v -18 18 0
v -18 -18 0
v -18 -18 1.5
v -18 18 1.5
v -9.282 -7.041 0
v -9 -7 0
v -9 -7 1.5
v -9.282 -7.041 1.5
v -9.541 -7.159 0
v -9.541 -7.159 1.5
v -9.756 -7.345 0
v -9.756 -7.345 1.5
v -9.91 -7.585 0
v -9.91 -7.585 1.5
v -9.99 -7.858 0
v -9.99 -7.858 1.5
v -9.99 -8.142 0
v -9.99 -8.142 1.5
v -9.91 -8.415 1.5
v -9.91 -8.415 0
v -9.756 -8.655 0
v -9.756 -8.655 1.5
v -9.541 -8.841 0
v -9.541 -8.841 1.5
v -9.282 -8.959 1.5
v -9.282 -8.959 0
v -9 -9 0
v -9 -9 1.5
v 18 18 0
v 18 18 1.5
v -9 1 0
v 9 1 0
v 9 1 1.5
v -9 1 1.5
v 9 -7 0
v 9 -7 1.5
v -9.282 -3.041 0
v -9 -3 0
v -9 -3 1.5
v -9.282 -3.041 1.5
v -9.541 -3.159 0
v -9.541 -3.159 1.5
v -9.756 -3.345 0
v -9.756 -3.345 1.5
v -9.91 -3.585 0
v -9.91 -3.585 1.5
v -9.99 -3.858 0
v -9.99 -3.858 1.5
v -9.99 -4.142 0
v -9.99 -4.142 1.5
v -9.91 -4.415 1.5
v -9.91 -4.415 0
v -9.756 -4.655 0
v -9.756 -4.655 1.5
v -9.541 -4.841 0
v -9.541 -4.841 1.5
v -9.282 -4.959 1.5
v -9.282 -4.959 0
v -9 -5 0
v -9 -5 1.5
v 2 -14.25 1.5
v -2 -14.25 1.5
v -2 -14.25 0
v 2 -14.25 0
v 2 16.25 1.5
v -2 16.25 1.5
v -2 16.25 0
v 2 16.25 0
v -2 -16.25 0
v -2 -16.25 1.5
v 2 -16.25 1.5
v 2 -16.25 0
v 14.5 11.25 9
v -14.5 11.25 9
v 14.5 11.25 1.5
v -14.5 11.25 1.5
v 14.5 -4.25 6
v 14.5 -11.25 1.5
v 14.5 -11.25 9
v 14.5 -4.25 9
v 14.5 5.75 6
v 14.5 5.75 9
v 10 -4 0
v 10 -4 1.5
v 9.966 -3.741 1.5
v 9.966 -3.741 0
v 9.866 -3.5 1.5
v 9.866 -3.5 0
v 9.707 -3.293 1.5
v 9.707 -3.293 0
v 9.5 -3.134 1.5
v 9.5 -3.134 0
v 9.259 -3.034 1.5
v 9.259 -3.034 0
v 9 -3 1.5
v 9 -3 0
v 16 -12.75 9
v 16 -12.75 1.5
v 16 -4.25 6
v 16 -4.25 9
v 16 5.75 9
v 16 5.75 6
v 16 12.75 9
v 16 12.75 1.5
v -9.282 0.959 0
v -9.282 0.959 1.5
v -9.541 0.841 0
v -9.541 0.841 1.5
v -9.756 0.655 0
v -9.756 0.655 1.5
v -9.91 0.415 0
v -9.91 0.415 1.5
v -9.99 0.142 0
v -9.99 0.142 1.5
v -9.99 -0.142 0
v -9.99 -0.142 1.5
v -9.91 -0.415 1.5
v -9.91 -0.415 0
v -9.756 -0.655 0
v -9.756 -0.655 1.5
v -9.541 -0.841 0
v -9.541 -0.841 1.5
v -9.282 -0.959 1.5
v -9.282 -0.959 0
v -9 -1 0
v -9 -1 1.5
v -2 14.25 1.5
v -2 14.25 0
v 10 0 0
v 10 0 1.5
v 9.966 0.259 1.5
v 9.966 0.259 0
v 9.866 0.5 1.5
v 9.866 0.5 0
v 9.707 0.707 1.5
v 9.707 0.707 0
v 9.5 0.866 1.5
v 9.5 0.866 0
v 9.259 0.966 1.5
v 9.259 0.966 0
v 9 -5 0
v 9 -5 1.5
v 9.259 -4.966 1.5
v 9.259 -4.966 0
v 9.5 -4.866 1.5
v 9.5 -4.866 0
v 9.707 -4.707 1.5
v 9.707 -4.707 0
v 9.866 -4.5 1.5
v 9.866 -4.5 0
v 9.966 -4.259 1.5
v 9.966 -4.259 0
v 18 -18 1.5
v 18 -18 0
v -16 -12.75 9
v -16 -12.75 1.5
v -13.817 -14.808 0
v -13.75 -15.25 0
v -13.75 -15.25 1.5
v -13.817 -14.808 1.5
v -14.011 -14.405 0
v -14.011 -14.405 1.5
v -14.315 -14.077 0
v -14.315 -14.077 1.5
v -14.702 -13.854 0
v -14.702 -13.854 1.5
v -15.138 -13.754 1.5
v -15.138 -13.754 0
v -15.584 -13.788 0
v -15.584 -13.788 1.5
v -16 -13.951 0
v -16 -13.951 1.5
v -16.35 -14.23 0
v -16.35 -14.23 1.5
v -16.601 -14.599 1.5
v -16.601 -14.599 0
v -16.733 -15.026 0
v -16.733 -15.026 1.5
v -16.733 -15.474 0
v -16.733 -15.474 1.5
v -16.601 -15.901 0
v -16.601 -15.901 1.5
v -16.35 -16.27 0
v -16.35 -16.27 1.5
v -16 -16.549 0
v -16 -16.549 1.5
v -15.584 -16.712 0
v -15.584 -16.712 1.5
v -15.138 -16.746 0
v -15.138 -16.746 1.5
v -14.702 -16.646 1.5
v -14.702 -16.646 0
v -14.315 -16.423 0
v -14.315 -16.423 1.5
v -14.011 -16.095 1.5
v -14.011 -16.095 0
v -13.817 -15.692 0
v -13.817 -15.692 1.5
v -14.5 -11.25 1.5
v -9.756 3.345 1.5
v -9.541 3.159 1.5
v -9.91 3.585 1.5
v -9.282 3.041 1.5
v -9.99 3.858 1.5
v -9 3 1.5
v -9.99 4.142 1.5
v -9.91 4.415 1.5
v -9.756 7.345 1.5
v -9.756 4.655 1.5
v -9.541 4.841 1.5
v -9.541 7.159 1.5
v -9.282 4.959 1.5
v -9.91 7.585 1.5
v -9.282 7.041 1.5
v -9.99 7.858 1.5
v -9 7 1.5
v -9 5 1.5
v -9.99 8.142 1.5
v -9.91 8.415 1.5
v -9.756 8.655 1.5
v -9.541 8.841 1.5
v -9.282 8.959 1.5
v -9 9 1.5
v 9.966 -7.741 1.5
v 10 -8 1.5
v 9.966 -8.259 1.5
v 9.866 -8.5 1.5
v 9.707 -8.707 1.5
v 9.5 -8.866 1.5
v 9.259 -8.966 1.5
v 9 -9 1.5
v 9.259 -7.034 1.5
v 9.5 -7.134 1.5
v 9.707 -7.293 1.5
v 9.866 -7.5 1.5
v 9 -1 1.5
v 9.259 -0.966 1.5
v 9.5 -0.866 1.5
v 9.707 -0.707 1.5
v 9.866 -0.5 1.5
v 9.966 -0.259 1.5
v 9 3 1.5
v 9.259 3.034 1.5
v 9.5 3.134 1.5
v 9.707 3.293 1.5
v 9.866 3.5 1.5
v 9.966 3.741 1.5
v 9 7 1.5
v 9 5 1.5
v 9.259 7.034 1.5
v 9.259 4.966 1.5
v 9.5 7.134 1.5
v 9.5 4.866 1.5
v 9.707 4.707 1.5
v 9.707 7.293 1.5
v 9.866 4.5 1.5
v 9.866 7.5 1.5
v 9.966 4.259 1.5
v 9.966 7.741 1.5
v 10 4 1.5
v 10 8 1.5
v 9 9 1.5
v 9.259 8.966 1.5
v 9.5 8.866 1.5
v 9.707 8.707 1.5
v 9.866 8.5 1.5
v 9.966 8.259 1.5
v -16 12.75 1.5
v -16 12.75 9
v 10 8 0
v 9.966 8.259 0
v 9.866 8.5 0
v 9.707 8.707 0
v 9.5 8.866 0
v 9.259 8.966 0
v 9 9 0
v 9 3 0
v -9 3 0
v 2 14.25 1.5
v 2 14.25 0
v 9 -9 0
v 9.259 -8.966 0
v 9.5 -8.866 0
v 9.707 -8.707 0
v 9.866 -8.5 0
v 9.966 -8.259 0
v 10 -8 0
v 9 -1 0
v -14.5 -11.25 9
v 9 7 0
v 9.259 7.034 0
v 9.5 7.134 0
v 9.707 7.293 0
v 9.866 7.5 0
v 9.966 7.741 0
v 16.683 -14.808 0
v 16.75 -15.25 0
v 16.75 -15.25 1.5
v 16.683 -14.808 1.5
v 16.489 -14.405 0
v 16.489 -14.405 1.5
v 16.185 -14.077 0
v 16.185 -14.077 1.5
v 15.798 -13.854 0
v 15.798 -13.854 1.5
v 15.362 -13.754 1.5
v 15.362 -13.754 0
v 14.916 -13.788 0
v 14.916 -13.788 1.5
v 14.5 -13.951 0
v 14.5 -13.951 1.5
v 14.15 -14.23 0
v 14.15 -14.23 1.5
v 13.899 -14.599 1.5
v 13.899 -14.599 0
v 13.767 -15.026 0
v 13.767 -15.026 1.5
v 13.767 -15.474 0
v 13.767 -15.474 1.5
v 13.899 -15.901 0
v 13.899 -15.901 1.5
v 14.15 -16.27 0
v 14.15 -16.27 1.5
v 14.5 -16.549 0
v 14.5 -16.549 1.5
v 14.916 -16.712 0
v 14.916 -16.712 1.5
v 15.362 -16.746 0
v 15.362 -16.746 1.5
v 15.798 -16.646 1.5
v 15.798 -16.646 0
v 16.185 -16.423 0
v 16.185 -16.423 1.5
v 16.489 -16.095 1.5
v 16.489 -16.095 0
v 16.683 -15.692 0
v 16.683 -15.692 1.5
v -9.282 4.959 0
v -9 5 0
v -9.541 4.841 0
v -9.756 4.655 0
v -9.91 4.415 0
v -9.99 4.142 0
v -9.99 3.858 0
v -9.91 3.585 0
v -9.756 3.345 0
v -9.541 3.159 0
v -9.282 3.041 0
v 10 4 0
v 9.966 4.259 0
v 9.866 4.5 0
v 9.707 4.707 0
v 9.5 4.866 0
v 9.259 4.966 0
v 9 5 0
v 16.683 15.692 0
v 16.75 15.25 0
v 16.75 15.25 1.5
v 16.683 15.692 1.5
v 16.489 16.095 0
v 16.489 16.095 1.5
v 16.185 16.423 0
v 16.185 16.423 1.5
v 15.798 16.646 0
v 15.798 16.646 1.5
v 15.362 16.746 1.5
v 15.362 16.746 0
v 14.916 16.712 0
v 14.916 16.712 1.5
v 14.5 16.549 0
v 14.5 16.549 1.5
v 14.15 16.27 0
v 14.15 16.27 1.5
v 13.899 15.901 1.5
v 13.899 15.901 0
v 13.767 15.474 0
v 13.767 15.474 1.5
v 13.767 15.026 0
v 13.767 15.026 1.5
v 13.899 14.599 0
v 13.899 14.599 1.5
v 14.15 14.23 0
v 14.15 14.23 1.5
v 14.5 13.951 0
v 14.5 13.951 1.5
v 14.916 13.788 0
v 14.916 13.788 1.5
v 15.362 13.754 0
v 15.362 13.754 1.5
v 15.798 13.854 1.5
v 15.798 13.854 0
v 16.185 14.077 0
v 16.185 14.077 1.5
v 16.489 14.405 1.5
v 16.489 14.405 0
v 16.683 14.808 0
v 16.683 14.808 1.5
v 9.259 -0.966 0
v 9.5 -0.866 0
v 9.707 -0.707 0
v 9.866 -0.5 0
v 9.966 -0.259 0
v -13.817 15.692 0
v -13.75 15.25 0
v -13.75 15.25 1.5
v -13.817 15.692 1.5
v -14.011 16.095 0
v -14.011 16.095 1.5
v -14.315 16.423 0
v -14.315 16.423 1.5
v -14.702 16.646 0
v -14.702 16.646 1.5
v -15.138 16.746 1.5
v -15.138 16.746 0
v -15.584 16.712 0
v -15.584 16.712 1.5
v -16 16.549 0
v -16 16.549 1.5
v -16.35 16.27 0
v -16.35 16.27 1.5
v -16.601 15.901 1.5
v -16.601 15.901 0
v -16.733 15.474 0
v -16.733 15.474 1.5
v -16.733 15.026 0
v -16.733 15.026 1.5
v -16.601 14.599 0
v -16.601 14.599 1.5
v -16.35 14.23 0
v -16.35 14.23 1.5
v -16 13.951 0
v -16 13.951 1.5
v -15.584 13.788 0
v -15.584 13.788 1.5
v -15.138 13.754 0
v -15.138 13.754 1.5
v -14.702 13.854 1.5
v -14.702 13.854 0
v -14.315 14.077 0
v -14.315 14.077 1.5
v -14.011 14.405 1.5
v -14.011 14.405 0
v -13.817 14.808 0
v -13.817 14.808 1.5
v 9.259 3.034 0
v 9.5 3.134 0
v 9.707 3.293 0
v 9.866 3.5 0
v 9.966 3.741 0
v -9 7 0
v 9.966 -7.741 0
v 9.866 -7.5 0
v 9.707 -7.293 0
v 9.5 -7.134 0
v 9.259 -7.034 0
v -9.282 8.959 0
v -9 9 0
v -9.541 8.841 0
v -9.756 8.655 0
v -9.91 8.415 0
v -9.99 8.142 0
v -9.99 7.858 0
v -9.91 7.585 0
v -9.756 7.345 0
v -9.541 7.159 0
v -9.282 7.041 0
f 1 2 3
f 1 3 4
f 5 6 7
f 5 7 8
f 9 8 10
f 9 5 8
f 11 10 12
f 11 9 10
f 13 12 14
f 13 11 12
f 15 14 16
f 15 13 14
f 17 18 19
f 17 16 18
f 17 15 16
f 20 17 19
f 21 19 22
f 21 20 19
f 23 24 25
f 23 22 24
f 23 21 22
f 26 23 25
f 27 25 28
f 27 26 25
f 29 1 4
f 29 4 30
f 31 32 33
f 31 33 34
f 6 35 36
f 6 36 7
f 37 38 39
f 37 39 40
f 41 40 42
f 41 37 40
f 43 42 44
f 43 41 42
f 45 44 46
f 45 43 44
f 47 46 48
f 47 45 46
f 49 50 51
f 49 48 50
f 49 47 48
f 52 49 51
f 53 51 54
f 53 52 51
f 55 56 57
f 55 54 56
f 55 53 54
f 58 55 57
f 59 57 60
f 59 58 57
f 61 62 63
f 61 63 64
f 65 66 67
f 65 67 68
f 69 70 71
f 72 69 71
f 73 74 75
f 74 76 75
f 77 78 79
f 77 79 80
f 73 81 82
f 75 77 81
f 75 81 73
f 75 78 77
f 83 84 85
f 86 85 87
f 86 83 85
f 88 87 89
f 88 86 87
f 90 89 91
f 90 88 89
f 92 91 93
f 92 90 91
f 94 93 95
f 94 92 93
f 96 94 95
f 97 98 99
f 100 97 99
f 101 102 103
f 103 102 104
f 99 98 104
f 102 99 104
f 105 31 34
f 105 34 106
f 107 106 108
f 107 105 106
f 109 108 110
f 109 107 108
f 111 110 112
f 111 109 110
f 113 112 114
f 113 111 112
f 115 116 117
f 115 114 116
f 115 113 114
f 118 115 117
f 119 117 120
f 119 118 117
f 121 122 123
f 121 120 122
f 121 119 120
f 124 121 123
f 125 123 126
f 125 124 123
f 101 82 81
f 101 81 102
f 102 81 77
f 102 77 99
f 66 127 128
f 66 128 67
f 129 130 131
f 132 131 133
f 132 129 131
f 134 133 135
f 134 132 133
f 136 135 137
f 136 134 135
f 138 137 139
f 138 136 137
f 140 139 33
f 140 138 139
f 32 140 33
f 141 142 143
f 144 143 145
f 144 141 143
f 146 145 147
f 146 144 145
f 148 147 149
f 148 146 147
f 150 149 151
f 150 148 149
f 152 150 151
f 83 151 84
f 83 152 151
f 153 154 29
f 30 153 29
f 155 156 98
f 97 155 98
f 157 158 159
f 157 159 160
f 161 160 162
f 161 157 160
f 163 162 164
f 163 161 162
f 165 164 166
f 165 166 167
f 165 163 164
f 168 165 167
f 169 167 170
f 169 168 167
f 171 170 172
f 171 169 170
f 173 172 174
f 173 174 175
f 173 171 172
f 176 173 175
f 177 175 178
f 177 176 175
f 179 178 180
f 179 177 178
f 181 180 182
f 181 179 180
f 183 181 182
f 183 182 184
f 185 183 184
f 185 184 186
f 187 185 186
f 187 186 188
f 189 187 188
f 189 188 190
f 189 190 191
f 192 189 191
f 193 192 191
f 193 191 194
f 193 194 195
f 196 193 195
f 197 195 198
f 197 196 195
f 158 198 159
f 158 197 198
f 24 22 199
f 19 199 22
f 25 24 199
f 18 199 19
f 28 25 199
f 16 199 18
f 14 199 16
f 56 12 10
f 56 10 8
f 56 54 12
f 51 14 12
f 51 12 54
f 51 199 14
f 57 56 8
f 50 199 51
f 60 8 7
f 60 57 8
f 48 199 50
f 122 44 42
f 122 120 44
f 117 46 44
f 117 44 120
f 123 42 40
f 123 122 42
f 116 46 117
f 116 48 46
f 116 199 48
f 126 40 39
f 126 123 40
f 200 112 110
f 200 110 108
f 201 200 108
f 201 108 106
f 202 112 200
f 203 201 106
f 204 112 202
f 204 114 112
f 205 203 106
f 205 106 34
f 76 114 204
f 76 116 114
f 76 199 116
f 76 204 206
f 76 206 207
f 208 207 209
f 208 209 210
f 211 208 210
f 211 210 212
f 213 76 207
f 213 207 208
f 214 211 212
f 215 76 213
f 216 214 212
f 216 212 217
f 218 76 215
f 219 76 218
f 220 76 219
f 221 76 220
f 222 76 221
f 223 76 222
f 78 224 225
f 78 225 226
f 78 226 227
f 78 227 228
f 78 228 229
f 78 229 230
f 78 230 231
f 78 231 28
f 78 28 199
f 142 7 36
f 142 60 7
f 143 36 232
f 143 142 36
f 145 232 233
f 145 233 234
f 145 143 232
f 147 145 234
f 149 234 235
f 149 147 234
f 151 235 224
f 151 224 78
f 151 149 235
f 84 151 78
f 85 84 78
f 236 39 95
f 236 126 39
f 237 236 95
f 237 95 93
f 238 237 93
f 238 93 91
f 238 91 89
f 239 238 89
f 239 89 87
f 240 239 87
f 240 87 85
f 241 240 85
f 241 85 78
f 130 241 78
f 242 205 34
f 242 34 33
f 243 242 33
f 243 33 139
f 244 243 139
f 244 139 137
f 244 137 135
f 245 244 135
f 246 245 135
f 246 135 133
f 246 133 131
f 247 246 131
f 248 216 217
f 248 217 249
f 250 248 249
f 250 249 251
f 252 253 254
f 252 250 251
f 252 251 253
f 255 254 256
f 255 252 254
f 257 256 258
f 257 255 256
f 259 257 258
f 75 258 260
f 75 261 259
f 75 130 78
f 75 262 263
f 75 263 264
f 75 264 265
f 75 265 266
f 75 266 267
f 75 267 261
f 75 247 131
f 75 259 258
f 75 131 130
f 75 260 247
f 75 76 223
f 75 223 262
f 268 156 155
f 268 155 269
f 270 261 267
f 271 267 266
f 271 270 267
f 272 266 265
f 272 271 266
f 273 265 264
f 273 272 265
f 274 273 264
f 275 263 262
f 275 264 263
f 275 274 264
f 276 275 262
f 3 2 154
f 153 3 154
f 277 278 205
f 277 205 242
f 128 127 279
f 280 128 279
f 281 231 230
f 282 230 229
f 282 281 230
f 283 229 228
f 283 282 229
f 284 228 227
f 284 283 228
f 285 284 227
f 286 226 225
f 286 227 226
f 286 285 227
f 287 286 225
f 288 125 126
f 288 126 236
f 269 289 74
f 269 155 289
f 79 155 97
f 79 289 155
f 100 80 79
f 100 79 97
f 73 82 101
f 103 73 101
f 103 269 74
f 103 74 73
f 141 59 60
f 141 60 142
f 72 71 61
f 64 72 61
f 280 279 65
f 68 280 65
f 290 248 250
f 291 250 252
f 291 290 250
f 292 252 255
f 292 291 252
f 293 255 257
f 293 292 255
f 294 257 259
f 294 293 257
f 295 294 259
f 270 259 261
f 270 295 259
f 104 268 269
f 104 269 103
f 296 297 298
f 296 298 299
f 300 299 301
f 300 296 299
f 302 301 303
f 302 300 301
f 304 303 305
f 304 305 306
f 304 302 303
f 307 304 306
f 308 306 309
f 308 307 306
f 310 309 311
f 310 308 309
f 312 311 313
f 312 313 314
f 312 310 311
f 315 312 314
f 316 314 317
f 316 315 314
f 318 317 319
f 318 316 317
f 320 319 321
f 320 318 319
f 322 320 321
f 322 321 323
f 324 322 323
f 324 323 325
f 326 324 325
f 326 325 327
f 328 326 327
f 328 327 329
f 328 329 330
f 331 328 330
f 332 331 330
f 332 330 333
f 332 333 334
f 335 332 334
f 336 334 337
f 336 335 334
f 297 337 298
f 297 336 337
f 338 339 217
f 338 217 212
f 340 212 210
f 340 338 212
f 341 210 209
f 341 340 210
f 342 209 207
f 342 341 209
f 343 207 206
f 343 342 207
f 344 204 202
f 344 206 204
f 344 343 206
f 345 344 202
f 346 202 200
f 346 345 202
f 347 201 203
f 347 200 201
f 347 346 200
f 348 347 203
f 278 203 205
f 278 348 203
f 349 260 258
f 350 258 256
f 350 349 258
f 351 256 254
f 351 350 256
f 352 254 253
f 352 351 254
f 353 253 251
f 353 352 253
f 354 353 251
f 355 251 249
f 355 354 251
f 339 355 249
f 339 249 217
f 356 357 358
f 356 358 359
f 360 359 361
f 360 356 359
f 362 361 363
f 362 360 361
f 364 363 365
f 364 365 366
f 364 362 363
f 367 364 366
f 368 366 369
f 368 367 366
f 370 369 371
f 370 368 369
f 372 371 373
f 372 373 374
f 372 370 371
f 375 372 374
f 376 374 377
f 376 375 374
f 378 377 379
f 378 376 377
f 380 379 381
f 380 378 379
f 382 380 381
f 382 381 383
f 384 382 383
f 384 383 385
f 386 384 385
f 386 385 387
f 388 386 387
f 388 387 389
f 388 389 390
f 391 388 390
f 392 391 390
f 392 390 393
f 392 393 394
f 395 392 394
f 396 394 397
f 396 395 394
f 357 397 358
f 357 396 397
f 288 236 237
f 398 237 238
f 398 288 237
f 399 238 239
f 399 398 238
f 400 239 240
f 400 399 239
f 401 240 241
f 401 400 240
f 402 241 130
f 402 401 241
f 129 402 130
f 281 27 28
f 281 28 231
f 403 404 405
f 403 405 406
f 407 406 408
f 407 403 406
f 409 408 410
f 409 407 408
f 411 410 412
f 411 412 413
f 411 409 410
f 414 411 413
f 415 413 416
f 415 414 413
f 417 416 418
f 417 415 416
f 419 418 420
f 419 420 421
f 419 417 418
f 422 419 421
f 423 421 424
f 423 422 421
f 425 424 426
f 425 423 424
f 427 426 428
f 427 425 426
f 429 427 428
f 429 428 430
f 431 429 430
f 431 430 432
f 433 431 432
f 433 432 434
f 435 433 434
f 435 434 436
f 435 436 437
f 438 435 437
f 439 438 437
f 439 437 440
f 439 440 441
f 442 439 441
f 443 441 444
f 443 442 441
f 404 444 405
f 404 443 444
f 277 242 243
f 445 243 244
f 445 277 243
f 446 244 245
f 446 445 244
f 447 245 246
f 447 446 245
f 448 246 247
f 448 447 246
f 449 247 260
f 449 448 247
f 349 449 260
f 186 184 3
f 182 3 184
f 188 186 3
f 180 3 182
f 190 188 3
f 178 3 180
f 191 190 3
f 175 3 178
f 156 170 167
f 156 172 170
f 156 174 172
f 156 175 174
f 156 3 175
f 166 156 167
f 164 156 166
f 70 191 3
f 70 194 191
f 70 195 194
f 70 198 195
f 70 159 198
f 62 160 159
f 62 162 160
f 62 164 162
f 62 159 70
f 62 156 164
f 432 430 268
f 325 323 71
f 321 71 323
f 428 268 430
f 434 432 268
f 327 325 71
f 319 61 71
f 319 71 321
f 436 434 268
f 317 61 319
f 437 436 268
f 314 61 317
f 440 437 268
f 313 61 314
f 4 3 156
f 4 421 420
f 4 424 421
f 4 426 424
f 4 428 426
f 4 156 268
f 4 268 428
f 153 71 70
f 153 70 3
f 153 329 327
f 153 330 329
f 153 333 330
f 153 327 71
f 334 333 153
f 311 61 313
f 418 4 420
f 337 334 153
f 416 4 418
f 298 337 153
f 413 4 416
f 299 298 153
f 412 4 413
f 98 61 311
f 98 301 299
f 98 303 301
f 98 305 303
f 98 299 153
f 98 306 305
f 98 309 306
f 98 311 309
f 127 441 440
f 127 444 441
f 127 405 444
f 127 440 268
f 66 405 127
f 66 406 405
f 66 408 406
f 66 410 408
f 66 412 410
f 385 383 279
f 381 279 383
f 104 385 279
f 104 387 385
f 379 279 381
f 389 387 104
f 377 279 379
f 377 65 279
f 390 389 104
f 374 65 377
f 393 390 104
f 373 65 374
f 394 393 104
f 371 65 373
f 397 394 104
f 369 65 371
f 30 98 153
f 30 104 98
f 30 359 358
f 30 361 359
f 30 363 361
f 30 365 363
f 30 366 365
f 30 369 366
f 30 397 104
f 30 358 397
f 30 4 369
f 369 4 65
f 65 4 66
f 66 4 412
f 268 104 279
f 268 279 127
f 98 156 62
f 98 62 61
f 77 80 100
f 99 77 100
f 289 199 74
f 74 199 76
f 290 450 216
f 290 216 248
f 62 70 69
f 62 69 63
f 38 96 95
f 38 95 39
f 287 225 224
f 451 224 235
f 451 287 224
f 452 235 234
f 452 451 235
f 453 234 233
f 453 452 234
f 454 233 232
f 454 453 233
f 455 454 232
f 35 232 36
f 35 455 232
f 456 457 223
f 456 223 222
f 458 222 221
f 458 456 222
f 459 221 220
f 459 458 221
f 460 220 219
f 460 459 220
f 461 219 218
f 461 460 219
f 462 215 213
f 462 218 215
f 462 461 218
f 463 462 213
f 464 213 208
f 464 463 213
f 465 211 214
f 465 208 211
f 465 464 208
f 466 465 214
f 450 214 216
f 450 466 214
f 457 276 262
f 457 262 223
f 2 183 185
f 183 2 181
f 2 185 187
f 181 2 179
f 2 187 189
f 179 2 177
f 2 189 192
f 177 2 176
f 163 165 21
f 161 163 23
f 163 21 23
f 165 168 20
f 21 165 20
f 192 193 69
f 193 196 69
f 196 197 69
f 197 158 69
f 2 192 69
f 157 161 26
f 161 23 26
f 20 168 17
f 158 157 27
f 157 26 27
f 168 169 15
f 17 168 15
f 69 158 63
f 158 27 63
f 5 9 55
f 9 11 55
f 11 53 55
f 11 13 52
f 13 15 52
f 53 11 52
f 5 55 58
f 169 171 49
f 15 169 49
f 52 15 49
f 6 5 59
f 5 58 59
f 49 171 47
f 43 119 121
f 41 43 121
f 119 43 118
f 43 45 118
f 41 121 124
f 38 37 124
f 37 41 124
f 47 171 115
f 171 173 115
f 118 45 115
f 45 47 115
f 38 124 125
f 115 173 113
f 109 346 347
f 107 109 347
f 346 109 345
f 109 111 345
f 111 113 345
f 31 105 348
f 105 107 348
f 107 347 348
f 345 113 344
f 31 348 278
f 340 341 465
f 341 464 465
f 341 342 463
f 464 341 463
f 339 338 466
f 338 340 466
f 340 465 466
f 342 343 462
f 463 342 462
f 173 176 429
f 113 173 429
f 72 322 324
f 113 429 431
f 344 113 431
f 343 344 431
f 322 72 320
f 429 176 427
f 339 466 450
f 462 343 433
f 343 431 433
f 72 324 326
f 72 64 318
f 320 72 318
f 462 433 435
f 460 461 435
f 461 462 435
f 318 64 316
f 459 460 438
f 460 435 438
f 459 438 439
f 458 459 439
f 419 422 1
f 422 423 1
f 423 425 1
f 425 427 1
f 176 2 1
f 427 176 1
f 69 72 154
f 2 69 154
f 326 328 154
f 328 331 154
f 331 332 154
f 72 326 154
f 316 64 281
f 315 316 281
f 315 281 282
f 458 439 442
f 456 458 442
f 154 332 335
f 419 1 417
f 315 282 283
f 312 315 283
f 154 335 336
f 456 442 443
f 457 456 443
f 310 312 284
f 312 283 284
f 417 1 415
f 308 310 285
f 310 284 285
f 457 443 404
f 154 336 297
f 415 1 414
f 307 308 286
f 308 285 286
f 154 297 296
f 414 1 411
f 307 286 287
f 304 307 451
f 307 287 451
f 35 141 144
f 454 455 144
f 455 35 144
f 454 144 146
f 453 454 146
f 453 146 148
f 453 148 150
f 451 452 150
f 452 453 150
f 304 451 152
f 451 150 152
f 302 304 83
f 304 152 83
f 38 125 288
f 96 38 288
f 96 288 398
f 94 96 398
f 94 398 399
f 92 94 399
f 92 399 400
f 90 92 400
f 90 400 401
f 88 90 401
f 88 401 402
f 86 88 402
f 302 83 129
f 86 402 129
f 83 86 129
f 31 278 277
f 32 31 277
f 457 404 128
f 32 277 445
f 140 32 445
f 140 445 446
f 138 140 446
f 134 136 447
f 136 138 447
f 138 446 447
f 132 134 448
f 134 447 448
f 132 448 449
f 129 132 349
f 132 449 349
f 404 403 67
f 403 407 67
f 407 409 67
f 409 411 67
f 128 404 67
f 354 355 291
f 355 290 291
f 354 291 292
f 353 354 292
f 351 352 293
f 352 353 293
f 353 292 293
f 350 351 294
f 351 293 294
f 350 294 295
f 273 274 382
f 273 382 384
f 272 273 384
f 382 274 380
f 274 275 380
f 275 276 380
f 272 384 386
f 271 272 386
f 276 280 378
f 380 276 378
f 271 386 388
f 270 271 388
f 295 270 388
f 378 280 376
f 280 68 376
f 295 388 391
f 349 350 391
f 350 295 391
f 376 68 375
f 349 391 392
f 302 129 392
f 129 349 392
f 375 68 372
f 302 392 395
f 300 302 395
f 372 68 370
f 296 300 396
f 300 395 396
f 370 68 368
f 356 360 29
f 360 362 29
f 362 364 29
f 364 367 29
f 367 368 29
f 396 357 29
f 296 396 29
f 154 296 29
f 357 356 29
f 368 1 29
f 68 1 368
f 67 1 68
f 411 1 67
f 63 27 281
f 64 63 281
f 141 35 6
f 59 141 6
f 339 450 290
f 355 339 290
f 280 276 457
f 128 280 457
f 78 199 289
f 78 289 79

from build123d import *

# Parameters (mm, degrees)
F0_W      = 36
F0_H      = 36
F0_R      = 1.5
F3_DEPTH  = 1.5
F1_W      = 32
F1_H      = 25.5
F4_DEPTH  = 9
F5_T      = -1.5
F6_DEPTH  = 25
F7_W      = 1.5
F7_H      = 10
F8_DEPTH  = 3
F9_W      = 4
F9_H      = 2
F10_DEPTH = 25


with BuildPart() as f3:
    # F0 (on Top) → F3 (new body)
    with BuildSketch(Plane.XY):
        Rectangle(F0_W, F0_H)
        with Locations((-15.25, -15.25)):
            Circle(F0_R, mode=Mode.SUBTRACT)
        with Locations((15.25, -15.25)):
            Circle(F0_R, mode=Mode.SUBTRACT)
        with Locations((-15.25, 15.25)):
            Circle(F0_R, mode=Mode.SUBTRACT)
        with Locations((15.25, 15.25)):
            Circle(F0_R, mode=Mode.SUBTRACT)
    extrude(amount=F3_DEPTH)

    # F1 (on Top) → F4 (join)
    with BuildSketch(Plane.XY):
        Rectangle(F1_W, F1_H)
    extrude(amount=F4_DEPTH)

    # F5
    f5_openings = [f3.faces().sort_by_distance(p)[0] for p in [
        (0, 0, 9),
    ]]
    offset(amount=F5_T, openings=f5_openings, kind=Kind.INTERSECTION)

    # F2 (on Top) → F6 (cut)
    with BuildSketch(Plane.XY):
        with BuildLine():
            ThreePointArc((-8, 0), (-8.2928932188, 0.7071067812), (-9, 1))
            Line((-9, 1), (-9, -1))
            ThreePointArc((-9, -1), (-8.2928932188, -0.7071067812), (-8, 0))
        make_face()
        with BuildLine():
            Line((9, 1), (-9, 1))
            ThreePointArc((-9, 1), (-8.2928932188, 0.7071067812), (-8, 0))
            ThreePointArc((-8, 0), (-8.2928932188, -0.7071067812), (-9, -1))
            Line((-9, -1), (9, -1))
            ThreePointArc((9, -1), (8, 0), (9, 1))
        make_face()
        with BuildLine():
            Line((-9, -1), (-9, 1))
            ThreePointArc((-9, 1), (-10, 0), (-9, -1))
        make_face()
        with BuildLine():
            ThreePointArc((10, 0), (9.7071067812, 0.7071067812), (9, 1))
            Line((9, 1), (9, -1))
            ThreePointArc((9, -1), (9.7071067812, -0.7071067812), (10, 0))
        make_face()
        with BuildLine():
            Line((9, -1), (9, 1))
            ThreePointArc((9, 1), (8, 0), (9, -1))
        make_face()
        with BuildLine():
            ThreePointArc((-8, 4), (-8.2928932188, 3.2928932188), (-9, 3))
            Line((-9, 3), (9, 3))
            ThreePointArc((9, 3), (8, 4), (9, 5))
            Line((9, 5), (-9, 5))
            ThreePointArc((-9, 5), (-8.2928932188, 4.7071067812), (-8, 4))
        make_face()
        with BuildLine():
            Line((-9, 5), (-9, 3))
            ThreePointArc((-9, 3), (-8.2928932188, 3.2928932188), (-8, 4))
            ThreePointArc((-8, 4), (-8.2928932188, 4.7071067812), (-9, 5))
        make_face()
        with BuildLine():
            ThreePointArc((-9, 5), (-10, 4), (-9, 3))
            Line((-9, 3), (-9, 5))
        make_face()
        with BuildLine():
            Line((9, 5), (9, 3))
            ThreePointArc((9, 3), (9.7071067812, 3.2928932188), (10, 4))
            ThreePointArc((10, 4), (9.7071067812, 4.7071067812), (9, 5))
        make_face()
        with BuildLine():
            ThreePointArc((9, 5), (8, 4), (9, 3))
            Line((9, 3), (9, 5))
        make_face()
        with BuildLine():
            ThreePointArc((-8, 8), (-8.2928932188, 7.2928932188), (-9, 7))
            Line((-9, 7), (9, 7))
            ThreePointArc((9, 7), (8, 8), (9, 9))
            Line((9, 9), (-9, 9))
            ThreePointArc((-9, 9), (-8.2928932188, 8.7071067812), (-8, 8))
        make_face()
        with BuildLine():
            Line((-9, 9), (-9, 7))
            ThreePointArc((-9, 7), (-8.2928932188, 7.2928932188), (-8, 8))
            ThreePointArc((-8, 8), (-8.2928932188, 8.7071067812), (-9, 9))
        make_face()
        with BuildLine():
            ThreePointArc((-9, 9), (-10, 8), (-9, 7))
            Line((-9, 7), (-9, 9))
        make_face()
        with BuildLine():
            Line((9, 9), (9, 7))
            ThreePointArc((9, 7), (9.7071067812, 7.2928932188), (10, 8))
            ThreePointArc((10, 8), (9.7071067812, 8.7071067812), (9, 9))
        make_face()
        with BuildLine():
            ThreePointArc((9, 9), (8, 8), (9, 7))
            Line((9, 7), (9, 9))
        make_face()
        with BuildLine():
            ThreePointArc((9, -5), (9.7071067812, -4.7071067812), (10, -4))
            ThreePointArc((10, -4), (9.7071067812, -3.2928932188), (9, -3))
            Line((9, -3), (9, -5))
        make_face()
        with BuildLine():
            Line((9, -5), (9, -3))
            ThreePointArc((9, -3), (8, -4), (9, -5))
        make_face()
        with BuildLine():
            ThreePointArc((9, -5), (8, -4), (9, -3))
            Line((9, -3), (-9, -3))
            ThreePointArc((-9, -3), (-8.2928932188, -3.2928932188), (-8, -4))
            ThreePointArc((-8, -4), (-8.2928932188, -4.7071067812), (-9, -5))
            Line((-9, -5), (9, -5))
        make_face()
        with BuildLine():
            Line((-9, -5), (-9, -3))
            ThreePointArc((-9, -3), (-10, -4), (-9, -5))
        make_face()
        with BuildLine():
            ThreePointArc((-8, -4), (-8.2928932188, -3.2928932188), (-9, -3))
            Line((-9, -3), (-9, -5))
            ThreePointArc((-9, -5), (-8.2928932188, -4.7071067812), (-8, -4))
        make_face()
        with BuildLine():
            ThreePointArc((9, -9), (9.7071067812, -8.7071067812), (10, -8))
            ThreePointArc((10, -8), (9.7071067812, -7.2928932188), (9, -7))
            Line((9, -7), (9, -9))
        make_face()
        with BuildLine():
            Line((9, -9), (9, -7))
            ThreePointArc((9, -7), (8, -8), (9, -9))
        make_face()
        with BuildLine():
            ThreePointArc((9, -9), (8, -8), (9, -7))
            Line((9, -7), (-9, -7))
            ThreePointArc((-9, -7), (-8.2928932188, -7.2928932188), (-8, -8))
            ThreePointArc((-8, -8), (-8.2928932188, -8.7071067812), (-9, -9))
            Line((-9, -9), (9, -9))
        make_face()
        with BuildLine():
            Line((-9, -9), (-9, -7))
            ThreePointArc((-9, -7), (-10, -8), (-9, -9))
        make_face()
        with BuildLine():
            ThreePointArc((-8, -8), (-8.2928932188, -7.2928932188), (-9, -7))
            Line((-9, -7), (-9, -9))
            ThreePointArc((-9, -9), (-8.2928932188, -8.7071067812), (-8, -8))
        make_face()
    extrude(amount=F6_DEPTH, mode=Mode.SUBTRACT)

    # F7 (on face) → F8 (cut)
    with BuildSketch(Plane.XY.offset(9)):
        with Locations((15.25, 0.75)):
            Rectangle(F7_W, F7_H)
    extrude(amount=-F8_DEPTH, mode=Mode.SUBTRACT)

    # F9 (on face) → F10 (cut)
    with BuildSketch(Plane.XY.offset(1.5)):
        with Locations((0, 15.25)):
            Rectangle(F9_W, F9_H)
        with Locations((0, -15.25)):
            Rectangle(F9_W, F9_H)
    extrude(amount=-F10_DEPTH, mode=Mode.SUBTRACT)


solid = f3.part
